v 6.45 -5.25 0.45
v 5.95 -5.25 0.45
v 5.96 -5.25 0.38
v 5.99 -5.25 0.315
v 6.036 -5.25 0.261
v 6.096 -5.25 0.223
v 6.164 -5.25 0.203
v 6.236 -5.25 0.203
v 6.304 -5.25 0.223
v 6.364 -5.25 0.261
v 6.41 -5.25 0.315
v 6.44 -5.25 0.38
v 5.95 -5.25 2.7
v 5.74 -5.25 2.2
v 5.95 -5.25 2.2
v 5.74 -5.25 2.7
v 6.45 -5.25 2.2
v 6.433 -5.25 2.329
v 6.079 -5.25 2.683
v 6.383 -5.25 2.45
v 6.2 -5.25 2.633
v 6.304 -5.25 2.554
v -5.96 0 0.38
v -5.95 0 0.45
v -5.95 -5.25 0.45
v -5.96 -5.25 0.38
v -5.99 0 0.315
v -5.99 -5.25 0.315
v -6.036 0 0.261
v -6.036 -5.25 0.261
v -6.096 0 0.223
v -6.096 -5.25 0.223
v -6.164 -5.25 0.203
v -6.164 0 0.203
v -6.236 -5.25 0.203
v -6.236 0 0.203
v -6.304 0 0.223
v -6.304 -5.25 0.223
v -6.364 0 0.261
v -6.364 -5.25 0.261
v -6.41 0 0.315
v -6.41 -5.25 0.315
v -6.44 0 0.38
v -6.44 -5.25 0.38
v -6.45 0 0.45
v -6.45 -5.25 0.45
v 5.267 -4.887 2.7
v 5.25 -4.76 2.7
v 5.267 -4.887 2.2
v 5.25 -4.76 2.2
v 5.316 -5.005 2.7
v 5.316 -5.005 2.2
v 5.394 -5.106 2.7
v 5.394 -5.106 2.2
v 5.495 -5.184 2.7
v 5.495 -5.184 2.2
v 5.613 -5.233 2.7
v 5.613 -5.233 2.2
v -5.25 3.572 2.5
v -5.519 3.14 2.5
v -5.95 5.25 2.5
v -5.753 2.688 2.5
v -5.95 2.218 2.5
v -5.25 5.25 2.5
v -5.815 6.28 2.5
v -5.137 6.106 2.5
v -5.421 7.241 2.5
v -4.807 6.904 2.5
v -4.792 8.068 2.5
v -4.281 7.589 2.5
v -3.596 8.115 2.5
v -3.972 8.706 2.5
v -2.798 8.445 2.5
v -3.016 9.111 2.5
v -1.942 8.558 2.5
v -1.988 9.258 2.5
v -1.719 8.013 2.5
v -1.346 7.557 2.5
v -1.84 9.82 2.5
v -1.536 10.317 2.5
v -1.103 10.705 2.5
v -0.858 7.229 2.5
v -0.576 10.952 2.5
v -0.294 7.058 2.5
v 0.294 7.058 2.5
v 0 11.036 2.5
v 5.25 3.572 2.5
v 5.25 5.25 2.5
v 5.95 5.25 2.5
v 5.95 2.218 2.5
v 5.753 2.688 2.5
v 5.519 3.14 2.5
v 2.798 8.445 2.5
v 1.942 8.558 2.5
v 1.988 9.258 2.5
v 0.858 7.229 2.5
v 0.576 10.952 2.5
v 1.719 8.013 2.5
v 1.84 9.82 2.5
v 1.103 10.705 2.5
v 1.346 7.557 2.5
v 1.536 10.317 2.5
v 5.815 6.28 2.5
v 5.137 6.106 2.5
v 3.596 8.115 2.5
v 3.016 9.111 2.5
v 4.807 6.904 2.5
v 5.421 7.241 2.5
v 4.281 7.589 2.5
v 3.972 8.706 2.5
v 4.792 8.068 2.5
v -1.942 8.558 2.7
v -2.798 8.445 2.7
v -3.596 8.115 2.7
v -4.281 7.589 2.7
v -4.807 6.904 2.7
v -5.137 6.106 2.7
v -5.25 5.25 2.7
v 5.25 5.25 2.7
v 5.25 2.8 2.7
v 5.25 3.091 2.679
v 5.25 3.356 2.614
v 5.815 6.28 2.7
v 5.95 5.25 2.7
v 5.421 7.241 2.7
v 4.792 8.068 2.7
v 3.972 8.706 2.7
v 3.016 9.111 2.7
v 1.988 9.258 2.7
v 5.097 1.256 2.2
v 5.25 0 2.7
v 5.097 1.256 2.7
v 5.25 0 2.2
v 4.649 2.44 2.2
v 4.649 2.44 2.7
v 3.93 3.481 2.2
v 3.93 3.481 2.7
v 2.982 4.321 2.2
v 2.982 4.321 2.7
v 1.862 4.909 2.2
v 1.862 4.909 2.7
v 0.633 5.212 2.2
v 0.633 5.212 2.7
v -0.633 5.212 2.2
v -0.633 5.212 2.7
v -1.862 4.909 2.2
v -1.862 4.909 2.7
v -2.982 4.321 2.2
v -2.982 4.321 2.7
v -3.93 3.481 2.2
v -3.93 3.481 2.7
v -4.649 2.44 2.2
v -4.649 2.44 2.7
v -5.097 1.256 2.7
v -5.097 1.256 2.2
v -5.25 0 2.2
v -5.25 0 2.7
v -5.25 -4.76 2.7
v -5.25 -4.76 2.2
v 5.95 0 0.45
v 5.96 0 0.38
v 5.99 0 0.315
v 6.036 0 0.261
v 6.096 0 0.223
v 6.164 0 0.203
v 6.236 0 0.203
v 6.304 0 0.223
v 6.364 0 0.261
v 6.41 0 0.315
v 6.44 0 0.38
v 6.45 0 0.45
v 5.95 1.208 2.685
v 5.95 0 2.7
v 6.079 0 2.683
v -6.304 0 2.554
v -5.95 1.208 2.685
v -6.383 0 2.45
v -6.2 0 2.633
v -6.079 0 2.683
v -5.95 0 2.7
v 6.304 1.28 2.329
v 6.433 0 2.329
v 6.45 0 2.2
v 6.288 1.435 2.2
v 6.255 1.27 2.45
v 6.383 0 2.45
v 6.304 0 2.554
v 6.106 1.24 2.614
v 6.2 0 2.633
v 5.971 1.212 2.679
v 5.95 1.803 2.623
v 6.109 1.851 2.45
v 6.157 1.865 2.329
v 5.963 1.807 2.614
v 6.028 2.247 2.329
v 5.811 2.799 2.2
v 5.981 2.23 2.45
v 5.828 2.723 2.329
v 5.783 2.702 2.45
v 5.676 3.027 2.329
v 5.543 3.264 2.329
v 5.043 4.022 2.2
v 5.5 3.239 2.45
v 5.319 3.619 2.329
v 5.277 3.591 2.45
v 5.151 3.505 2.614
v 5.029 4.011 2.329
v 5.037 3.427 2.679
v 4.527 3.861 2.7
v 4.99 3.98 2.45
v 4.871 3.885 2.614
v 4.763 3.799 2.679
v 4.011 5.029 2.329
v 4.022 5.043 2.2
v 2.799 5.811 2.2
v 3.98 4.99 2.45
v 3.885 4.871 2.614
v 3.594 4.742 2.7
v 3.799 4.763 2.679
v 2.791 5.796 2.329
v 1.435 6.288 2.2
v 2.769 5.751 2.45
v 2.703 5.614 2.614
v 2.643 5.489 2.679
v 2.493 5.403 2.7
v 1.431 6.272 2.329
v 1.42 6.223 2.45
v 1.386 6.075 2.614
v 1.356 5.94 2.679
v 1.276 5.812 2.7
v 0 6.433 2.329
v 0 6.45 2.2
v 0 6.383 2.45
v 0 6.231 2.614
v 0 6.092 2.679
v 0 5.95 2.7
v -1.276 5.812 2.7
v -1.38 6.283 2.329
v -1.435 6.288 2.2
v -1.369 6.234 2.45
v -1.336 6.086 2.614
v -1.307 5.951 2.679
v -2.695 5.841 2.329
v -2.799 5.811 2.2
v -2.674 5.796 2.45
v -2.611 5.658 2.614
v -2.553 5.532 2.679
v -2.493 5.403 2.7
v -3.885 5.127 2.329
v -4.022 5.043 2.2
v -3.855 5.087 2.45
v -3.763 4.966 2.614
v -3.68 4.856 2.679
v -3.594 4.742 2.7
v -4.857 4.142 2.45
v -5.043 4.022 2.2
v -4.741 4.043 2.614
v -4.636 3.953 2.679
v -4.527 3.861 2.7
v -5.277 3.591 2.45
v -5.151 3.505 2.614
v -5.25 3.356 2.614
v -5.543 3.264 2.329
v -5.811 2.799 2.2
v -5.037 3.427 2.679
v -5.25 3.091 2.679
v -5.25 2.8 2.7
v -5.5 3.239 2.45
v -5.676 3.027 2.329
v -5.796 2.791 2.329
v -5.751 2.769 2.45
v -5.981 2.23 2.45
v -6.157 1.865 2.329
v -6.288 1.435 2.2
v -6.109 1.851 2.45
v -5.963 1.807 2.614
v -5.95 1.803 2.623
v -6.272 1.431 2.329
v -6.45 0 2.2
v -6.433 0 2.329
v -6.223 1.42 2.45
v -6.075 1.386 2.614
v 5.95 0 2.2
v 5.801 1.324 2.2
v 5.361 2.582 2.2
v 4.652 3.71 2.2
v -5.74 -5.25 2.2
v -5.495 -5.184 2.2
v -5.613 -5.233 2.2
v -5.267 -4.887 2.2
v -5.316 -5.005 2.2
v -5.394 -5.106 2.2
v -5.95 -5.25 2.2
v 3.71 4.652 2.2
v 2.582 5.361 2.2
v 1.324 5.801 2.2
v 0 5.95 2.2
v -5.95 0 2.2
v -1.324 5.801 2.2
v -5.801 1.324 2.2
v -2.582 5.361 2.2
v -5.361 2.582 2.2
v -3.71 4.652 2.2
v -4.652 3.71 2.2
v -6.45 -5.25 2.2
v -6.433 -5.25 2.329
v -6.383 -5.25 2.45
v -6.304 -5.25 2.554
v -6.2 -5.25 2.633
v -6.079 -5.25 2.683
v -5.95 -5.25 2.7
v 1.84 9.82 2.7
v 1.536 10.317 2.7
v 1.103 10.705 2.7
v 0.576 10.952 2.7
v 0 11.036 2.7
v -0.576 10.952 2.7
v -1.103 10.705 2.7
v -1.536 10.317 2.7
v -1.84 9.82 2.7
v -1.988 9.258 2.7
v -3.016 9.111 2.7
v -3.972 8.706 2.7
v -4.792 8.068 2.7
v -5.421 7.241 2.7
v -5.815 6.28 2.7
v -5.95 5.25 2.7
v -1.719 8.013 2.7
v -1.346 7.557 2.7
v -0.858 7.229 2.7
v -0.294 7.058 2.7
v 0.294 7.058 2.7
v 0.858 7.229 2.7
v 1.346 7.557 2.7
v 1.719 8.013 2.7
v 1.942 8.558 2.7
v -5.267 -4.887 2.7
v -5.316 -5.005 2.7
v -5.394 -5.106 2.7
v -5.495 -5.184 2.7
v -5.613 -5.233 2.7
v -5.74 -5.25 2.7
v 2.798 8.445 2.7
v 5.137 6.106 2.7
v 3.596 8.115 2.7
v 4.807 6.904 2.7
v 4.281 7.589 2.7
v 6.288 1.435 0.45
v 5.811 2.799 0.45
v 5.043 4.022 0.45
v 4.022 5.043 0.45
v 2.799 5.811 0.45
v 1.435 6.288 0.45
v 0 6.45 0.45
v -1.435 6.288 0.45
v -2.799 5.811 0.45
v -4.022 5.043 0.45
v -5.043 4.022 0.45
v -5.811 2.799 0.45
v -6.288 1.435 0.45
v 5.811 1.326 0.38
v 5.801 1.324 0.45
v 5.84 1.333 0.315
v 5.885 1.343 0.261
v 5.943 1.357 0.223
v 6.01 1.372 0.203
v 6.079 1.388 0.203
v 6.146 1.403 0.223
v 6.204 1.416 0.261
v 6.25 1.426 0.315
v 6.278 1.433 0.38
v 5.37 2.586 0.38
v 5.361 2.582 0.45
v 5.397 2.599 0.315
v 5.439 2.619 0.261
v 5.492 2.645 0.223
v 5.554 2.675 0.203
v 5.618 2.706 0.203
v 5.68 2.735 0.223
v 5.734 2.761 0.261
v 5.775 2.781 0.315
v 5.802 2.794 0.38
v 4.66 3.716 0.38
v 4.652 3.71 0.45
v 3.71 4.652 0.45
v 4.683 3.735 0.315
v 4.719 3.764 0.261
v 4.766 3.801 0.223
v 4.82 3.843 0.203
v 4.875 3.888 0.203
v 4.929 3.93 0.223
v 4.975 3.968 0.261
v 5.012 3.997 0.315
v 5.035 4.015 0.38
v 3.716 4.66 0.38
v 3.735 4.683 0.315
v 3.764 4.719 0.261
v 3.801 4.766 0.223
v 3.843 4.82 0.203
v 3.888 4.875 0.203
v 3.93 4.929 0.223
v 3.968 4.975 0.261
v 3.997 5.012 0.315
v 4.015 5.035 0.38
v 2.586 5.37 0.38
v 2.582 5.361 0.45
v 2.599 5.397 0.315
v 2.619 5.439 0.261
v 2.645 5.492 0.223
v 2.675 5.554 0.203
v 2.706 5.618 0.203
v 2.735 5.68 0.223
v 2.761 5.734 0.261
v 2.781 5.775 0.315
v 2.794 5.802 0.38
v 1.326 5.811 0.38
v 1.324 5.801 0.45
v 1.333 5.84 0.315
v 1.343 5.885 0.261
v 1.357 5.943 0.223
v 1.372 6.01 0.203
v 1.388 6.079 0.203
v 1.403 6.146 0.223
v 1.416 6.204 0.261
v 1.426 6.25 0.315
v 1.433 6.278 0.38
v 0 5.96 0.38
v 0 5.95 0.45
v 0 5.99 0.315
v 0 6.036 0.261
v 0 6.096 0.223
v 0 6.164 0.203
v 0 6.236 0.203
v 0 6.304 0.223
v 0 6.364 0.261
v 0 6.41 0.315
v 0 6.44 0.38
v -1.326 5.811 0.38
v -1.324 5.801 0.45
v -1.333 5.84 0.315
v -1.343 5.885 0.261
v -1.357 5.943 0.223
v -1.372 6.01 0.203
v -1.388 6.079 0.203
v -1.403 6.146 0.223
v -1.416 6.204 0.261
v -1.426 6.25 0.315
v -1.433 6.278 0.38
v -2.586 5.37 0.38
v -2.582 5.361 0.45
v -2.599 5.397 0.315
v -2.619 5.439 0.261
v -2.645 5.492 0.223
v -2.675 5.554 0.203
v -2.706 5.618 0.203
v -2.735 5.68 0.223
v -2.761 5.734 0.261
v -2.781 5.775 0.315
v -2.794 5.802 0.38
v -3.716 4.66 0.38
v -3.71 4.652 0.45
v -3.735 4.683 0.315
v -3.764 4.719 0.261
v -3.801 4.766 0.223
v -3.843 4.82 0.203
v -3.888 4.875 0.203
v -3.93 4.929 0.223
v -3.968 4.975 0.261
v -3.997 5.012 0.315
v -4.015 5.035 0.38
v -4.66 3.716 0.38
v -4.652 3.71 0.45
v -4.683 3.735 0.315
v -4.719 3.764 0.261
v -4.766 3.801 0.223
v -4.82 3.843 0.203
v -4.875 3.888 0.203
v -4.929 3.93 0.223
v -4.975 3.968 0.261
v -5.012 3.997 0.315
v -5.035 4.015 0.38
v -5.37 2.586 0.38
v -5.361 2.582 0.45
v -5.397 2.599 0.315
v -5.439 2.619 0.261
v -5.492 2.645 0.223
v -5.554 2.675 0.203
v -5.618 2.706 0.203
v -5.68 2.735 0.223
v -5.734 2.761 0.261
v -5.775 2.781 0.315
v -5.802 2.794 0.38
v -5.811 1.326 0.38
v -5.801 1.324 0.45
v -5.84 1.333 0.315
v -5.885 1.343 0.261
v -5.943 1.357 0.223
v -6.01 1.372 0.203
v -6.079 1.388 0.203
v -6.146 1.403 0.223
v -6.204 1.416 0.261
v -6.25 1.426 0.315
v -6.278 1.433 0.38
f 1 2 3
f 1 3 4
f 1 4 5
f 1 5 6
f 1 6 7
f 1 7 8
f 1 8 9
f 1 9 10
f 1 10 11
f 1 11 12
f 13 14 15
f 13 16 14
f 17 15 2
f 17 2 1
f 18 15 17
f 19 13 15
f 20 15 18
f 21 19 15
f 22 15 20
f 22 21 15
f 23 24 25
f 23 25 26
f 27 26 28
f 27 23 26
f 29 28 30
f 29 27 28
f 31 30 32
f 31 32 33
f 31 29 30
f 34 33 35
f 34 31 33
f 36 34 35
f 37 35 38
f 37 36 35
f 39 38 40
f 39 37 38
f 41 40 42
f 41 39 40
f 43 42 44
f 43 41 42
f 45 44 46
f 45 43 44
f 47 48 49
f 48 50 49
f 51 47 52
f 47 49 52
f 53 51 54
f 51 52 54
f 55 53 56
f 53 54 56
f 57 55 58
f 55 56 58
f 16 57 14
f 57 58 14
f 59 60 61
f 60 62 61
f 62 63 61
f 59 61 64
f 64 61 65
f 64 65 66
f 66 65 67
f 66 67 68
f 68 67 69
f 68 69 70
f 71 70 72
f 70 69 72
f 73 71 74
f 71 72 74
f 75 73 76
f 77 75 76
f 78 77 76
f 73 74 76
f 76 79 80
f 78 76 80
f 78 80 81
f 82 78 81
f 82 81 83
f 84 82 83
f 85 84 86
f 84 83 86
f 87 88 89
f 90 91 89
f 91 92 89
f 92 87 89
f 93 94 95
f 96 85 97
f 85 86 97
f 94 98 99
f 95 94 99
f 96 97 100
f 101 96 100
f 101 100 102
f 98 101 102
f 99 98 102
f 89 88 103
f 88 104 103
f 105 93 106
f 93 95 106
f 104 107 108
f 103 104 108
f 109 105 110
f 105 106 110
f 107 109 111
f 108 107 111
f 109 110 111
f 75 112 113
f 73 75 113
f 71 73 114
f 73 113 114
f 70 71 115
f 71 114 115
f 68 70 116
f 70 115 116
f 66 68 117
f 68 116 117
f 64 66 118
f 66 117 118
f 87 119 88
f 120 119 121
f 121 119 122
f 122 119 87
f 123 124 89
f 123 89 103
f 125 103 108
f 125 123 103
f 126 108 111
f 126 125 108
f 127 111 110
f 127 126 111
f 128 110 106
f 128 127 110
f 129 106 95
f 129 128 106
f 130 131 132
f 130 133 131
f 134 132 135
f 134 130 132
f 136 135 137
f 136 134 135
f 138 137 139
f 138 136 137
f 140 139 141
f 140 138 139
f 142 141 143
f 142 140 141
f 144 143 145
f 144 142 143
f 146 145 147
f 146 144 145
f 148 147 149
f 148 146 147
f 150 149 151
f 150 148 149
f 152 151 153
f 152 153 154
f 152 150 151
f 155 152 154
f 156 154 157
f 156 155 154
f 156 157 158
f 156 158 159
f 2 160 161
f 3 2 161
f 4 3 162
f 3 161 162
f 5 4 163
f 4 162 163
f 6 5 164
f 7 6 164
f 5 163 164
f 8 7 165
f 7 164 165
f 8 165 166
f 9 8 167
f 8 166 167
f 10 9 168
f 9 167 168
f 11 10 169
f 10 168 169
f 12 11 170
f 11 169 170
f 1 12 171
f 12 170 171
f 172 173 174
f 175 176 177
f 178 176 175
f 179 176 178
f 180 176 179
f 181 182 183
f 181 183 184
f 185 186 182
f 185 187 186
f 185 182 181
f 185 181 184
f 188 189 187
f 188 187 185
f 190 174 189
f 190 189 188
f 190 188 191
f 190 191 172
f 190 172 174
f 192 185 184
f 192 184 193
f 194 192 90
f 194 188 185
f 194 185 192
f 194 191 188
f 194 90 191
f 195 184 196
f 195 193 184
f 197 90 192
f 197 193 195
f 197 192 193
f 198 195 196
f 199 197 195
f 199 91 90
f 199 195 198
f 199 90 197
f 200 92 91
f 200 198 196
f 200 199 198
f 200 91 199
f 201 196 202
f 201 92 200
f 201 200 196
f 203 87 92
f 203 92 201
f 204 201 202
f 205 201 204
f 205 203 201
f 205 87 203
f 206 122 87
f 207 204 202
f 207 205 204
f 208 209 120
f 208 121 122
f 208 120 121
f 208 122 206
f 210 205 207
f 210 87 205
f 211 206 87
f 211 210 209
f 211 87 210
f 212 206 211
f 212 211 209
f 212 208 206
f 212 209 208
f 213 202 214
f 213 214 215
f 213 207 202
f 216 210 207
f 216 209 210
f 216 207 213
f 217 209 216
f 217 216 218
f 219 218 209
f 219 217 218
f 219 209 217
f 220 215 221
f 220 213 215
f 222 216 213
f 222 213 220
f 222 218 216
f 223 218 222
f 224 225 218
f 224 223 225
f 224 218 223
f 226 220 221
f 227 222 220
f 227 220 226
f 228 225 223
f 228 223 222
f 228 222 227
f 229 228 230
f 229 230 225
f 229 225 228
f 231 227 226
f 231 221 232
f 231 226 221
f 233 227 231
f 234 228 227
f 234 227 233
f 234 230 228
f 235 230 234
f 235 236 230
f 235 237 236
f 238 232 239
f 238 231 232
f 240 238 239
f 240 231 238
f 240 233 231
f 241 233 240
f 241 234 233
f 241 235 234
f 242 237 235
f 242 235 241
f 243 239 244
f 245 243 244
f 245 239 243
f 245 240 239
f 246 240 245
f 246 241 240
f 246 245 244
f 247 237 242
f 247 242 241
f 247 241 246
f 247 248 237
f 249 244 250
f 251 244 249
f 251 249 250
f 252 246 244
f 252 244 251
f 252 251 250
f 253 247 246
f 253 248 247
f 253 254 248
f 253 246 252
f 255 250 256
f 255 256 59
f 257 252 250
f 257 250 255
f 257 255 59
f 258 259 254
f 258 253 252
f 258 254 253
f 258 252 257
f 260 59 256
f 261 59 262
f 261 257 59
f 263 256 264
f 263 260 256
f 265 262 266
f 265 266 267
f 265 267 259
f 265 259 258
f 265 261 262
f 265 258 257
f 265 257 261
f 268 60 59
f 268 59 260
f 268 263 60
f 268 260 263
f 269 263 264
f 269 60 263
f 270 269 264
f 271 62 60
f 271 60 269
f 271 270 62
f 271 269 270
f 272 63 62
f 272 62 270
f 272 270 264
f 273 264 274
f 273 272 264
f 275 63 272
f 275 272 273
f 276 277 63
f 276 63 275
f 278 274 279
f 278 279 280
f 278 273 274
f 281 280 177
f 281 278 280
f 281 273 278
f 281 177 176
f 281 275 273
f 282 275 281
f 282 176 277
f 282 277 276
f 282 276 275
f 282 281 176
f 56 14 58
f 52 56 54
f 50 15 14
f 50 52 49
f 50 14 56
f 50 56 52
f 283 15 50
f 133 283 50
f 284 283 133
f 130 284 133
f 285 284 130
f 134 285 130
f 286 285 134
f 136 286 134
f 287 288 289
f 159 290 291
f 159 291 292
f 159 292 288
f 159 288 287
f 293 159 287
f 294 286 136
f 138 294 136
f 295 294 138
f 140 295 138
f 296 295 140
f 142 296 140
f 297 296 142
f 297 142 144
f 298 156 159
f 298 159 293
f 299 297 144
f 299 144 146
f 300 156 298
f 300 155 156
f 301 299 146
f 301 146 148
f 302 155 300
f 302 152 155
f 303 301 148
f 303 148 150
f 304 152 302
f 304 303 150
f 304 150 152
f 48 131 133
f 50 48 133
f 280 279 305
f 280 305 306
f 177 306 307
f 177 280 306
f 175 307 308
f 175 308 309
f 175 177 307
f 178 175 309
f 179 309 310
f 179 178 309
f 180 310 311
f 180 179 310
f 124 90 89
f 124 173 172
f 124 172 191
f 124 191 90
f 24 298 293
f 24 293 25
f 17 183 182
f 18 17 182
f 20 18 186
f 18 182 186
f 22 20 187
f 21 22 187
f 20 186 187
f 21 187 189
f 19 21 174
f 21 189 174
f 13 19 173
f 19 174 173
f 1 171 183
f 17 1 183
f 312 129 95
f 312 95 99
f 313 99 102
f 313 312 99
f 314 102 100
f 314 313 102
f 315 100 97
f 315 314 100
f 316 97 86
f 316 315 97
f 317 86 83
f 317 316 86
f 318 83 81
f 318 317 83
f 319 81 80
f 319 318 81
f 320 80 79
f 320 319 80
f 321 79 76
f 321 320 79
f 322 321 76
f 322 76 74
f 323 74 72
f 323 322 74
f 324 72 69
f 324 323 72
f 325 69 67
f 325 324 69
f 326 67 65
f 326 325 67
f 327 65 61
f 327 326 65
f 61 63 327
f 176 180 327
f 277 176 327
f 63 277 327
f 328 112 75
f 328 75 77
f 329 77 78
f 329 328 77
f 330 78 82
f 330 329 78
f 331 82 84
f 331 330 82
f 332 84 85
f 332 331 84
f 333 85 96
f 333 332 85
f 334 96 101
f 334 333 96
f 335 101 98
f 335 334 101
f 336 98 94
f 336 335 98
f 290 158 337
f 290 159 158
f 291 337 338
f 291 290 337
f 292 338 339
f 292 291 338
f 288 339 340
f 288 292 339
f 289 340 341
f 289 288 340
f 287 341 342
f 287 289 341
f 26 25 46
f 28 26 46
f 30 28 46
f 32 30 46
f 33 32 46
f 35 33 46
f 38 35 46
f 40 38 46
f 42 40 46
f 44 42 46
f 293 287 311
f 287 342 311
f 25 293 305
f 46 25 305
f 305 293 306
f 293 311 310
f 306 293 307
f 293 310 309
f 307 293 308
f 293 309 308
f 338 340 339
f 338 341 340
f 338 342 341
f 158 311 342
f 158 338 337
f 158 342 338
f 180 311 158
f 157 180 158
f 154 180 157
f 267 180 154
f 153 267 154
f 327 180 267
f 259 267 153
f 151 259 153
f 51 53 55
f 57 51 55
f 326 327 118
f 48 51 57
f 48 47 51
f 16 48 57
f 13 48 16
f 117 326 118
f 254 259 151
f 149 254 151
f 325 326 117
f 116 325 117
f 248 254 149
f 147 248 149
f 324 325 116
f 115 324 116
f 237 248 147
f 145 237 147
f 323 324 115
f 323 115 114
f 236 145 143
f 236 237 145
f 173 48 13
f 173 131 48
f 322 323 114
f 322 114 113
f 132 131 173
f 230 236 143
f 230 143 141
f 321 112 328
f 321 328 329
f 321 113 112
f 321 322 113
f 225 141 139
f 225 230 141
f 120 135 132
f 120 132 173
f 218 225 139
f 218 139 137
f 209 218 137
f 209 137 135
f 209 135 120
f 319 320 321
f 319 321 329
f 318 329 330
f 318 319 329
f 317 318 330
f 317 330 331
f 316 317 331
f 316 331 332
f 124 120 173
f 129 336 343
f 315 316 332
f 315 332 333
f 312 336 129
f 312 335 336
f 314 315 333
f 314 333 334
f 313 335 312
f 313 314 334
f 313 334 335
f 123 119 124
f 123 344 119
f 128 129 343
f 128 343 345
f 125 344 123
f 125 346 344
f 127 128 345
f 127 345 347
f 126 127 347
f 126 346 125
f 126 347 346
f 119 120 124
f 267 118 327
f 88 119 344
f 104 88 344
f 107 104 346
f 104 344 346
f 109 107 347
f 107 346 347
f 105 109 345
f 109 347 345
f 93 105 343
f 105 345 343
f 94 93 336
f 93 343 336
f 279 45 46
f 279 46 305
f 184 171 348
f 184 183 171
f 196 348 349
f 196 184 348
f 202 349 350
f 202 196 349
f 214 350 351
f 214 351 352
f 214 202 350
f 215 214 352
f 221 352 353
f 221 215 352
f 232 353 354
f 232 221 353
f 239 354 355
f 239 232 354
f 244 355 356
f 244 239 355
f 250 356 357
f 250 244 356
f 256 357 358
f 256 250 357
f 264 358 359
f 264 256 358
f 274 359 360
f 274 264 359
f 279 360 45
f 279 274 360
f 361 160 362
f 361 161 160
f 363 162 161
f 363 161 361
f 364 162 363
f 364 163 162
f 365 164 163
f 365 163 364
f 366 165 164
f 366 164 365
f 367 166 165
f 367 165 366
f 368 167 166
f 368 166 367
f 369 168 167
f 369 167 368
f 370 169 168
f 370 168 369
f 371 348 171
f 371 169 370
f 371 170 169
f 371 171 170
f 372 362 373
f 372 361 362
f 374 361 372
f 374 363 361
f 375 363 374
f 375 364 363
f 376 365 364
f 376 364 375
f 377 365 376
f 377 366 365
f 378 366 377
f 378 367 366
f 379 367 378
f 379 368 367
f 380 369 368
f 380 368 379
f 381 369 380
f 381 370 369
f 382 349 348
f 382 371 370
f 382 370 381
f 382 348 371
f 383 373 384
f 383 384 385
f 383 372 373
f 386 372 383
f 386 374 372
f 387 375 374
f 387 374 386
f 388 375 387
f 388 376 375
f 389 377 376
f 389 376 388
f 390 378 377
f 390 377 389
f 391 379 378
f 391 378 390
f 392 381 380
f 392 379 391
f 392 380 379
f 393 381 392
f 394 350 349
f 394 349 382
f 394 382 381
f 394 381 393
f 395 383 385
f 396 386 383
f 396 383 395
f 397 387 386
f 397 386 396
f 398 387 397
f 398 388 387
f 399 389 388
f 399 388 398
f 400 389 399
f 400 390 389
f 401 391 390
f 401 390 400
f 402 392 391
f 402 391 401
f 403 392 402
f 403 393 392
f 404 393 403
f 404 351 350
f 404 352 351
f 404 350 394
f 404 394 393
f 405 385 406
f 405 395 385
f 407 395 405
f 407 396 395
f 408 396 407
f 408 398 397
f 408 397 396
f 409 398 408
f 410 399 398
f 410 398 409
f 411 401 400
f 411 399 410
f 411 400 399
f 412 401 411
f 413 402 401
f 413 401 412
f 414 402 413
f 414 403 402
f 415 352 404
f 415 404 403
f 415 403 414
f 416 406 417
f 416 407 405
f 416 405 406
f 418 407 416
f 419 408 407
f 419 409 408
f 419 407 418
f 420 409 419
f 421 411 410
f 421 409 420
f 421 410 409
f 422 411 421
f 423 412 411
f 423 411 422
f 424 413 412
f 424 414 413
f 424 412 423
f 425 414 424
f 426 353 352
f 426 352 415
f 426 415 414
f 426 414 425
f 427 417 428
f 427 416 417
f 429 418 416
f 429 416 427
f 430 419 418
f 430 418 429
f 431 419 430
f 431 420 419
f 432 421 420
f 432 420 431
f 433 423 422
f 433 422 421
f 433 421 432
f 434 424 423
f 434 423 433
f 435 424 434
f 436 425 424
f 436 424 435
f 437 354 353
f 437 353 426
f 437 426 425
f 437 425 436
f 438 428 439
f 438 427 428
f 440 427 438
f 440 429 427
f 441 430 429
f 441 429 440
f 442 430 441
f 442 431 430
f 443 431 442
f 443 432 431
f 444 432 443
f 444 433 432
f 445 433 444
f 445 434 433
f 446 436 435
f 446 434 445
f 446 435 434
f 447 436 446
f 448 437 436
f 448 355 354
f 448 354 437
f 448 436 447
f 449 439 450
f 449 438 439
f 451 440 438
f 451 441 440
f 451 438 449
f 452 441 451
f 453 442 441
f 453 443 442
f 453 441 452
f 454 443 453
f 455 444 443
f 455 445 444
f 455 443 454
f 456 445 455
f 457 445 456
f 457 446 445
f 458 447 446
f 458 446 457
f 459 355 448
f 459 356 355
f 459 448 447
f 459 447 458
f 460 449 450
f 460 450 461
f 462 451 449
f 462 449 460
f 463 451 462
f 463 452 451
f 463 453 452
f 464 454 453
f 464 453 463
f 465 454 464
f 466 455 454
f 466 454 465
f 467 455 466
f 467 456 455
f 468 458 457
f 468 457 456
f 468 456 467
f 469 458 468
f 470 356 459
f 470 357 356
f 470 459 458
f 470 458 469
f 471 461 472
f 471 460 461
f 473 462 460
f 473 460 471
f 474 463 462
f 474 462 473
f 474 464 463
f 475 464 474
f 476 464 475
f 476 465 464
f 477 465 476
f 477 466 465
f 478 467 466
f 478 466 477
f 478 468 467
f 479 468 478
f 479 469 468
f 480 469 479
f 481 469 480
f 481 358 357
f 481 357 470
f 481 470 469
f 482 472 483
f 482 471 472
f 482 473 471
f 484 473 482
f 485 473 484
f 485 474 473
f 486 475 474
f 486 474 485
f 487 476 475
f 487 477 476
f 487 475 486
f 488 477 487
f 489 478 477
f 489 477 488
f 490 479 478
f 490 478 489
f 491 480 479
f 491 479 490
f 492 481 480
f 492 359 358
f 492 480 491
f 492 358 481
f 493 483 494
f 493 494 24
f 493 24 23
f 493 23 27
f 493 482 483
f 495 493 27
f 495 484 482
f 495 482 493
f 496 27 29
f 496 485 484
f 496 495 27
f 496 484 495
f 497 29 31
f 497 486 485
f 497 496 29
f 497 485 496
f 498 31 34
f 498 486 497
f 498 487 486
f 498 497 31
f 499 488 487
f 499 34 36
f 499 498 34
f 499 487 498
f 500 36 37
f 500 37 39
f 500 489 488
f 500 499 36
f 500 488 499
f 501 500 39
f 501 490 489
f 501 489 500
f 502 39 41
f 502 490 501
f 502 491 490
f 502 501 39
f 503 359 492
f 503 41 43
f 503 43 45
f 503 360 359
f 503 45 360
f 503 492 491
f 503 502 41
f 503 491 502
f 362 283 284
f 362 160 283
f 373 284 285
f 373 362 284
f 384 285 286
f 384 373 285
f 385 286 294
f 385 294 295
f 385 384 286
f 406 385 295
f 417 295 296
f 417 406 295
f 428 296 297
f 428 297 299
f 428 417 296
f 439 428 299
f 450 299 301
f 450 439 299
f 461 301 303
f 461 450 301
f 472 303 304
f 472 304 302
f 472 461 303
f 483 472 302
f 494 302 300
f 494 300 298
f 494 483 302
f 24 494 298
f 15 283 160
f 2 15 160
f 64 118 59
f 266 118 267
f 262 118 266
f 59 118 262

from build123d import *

# Parameters (mm, degrees)
REVOLUTION003_ANGLE = 180
PAD021_DEPTH        = 5.25
FILLET004_R         = 0.49
PAD022_DEPTH        = 0.2


with BuildPart() as part:
    # Sketch038 → Revolution003 (revolve)
    with BuildSketch(Plane.XZ):
        with BuildLine():
            Line((5.25, 2.7), (5.25, 2.2))
            Line((5.25, 2.2), (5.95, 2.2))
            Line((5.95, 2.2), (5.95, 0.45))
            ThreePointArc((5.95, 0.45), (6.2, 0.2), (6.45, 0.45))
            Line((6.45, 0.45), (6.45, 2.2))
            ThreePointArc((6.45, 2.2), (6.3035533906, 2.5535533906), (5.95, 2.7))
            Line((5.25, 2.7), (5.95, 2.7))
        make_face()
    revolve(axis=Axis((0, 0, 0), (0, 0, 1)), revolution_arc=REVOLUTION003_ANGLE)

    # Sketch038 → Pad021 (new body)
    with BuildSketch(Plane.XZ):
        with BuildLine():
            Line((5.25, 2.7), (5.25, 2.2))
            Line((5.25, 2.2), (5.95, 2.2))
            Line((5.95, 2.2), (5.95, 0.45))
            ThreePointArc((5.95, 0.45), (6.2, 0.2), (6.45, 0.45))
            Line((6.45, 0.45), (6.45, 2.2))
            ThreePointArc((6.45, 2.2), (6.3035533906, 2.5535533906), (5.95, 2.7))
            Line((5.25, 2.7), (5.95, 2.7))
        make_face()
    pad021 = extrude(amount=PAD021_DEPTH)

    # Mirrored: Pad021 across Sketch038 V_Axis
    add(pad021.mirror(Plane(origin=(0, 0, 0), x_dir=(0, -1, 0), z_dir=(1, 0, 0))))

    # Fillet004
    fillet004_edges = [part.edges().sort_by_distance(p)[0] for p in [
        (-5.25, -5.25, 2.45),
        (5.25, -5.25, 2.45),
    ]]
    fillet(fillet004_edges, radius=FILLET004_R)

    # Sketch045 → Pad022 (join)
    with BuildSketch(Plane.XY.offset(2.7)):
        with BuildLine():
            ThreePointArc((-1.9419855366, 8.5580144634), (0, 7.0362321709), (1.9419855366, 8.5580144634))
            ThreePointArc((5.25, 5.25), (4.2811049959, 7.5891194594), (1.9419855366, 8.5580144634))
            Line((5.25, 5.25), (5.25, 2.8))
            ThreePointArc((5.95, 0), (5.7723478759, 1.443086969), (5.25, 2.8))
            Line((5.95, 0), (5.95, 5.25))
            ThreePointArc((5.95, 5.25), (4.7921943754, 8.0678874204), (1.9876941818, 9.2577538171))
            ThreePointArc((1.9876941818, 9.2577538172), (0, 11.0362321709), (-1.9876941818, 9.2577538172))
            ThreePointArc((-1.9876941818, 9.2577538171), (-4.7921943754, 8.0678874204), (-5.95, 5.25))
            Line((-5.95, 0), (-5.95, 5.25))
            ThreePointArc((-5.25, 2.8), (-5.7723478759, 1.443086969), (-5.95, 0))
            Line((-5.25, 5.25), (-5.25, 2.8))
            ThreePointArc((-1.9419855366, 8.5580144634), (-4.2811049959, 7.5891194594), (-5.25, 5.25))
        make_face()
    extrude(amount=-PAD022_DEPTH)


solid = part.part
